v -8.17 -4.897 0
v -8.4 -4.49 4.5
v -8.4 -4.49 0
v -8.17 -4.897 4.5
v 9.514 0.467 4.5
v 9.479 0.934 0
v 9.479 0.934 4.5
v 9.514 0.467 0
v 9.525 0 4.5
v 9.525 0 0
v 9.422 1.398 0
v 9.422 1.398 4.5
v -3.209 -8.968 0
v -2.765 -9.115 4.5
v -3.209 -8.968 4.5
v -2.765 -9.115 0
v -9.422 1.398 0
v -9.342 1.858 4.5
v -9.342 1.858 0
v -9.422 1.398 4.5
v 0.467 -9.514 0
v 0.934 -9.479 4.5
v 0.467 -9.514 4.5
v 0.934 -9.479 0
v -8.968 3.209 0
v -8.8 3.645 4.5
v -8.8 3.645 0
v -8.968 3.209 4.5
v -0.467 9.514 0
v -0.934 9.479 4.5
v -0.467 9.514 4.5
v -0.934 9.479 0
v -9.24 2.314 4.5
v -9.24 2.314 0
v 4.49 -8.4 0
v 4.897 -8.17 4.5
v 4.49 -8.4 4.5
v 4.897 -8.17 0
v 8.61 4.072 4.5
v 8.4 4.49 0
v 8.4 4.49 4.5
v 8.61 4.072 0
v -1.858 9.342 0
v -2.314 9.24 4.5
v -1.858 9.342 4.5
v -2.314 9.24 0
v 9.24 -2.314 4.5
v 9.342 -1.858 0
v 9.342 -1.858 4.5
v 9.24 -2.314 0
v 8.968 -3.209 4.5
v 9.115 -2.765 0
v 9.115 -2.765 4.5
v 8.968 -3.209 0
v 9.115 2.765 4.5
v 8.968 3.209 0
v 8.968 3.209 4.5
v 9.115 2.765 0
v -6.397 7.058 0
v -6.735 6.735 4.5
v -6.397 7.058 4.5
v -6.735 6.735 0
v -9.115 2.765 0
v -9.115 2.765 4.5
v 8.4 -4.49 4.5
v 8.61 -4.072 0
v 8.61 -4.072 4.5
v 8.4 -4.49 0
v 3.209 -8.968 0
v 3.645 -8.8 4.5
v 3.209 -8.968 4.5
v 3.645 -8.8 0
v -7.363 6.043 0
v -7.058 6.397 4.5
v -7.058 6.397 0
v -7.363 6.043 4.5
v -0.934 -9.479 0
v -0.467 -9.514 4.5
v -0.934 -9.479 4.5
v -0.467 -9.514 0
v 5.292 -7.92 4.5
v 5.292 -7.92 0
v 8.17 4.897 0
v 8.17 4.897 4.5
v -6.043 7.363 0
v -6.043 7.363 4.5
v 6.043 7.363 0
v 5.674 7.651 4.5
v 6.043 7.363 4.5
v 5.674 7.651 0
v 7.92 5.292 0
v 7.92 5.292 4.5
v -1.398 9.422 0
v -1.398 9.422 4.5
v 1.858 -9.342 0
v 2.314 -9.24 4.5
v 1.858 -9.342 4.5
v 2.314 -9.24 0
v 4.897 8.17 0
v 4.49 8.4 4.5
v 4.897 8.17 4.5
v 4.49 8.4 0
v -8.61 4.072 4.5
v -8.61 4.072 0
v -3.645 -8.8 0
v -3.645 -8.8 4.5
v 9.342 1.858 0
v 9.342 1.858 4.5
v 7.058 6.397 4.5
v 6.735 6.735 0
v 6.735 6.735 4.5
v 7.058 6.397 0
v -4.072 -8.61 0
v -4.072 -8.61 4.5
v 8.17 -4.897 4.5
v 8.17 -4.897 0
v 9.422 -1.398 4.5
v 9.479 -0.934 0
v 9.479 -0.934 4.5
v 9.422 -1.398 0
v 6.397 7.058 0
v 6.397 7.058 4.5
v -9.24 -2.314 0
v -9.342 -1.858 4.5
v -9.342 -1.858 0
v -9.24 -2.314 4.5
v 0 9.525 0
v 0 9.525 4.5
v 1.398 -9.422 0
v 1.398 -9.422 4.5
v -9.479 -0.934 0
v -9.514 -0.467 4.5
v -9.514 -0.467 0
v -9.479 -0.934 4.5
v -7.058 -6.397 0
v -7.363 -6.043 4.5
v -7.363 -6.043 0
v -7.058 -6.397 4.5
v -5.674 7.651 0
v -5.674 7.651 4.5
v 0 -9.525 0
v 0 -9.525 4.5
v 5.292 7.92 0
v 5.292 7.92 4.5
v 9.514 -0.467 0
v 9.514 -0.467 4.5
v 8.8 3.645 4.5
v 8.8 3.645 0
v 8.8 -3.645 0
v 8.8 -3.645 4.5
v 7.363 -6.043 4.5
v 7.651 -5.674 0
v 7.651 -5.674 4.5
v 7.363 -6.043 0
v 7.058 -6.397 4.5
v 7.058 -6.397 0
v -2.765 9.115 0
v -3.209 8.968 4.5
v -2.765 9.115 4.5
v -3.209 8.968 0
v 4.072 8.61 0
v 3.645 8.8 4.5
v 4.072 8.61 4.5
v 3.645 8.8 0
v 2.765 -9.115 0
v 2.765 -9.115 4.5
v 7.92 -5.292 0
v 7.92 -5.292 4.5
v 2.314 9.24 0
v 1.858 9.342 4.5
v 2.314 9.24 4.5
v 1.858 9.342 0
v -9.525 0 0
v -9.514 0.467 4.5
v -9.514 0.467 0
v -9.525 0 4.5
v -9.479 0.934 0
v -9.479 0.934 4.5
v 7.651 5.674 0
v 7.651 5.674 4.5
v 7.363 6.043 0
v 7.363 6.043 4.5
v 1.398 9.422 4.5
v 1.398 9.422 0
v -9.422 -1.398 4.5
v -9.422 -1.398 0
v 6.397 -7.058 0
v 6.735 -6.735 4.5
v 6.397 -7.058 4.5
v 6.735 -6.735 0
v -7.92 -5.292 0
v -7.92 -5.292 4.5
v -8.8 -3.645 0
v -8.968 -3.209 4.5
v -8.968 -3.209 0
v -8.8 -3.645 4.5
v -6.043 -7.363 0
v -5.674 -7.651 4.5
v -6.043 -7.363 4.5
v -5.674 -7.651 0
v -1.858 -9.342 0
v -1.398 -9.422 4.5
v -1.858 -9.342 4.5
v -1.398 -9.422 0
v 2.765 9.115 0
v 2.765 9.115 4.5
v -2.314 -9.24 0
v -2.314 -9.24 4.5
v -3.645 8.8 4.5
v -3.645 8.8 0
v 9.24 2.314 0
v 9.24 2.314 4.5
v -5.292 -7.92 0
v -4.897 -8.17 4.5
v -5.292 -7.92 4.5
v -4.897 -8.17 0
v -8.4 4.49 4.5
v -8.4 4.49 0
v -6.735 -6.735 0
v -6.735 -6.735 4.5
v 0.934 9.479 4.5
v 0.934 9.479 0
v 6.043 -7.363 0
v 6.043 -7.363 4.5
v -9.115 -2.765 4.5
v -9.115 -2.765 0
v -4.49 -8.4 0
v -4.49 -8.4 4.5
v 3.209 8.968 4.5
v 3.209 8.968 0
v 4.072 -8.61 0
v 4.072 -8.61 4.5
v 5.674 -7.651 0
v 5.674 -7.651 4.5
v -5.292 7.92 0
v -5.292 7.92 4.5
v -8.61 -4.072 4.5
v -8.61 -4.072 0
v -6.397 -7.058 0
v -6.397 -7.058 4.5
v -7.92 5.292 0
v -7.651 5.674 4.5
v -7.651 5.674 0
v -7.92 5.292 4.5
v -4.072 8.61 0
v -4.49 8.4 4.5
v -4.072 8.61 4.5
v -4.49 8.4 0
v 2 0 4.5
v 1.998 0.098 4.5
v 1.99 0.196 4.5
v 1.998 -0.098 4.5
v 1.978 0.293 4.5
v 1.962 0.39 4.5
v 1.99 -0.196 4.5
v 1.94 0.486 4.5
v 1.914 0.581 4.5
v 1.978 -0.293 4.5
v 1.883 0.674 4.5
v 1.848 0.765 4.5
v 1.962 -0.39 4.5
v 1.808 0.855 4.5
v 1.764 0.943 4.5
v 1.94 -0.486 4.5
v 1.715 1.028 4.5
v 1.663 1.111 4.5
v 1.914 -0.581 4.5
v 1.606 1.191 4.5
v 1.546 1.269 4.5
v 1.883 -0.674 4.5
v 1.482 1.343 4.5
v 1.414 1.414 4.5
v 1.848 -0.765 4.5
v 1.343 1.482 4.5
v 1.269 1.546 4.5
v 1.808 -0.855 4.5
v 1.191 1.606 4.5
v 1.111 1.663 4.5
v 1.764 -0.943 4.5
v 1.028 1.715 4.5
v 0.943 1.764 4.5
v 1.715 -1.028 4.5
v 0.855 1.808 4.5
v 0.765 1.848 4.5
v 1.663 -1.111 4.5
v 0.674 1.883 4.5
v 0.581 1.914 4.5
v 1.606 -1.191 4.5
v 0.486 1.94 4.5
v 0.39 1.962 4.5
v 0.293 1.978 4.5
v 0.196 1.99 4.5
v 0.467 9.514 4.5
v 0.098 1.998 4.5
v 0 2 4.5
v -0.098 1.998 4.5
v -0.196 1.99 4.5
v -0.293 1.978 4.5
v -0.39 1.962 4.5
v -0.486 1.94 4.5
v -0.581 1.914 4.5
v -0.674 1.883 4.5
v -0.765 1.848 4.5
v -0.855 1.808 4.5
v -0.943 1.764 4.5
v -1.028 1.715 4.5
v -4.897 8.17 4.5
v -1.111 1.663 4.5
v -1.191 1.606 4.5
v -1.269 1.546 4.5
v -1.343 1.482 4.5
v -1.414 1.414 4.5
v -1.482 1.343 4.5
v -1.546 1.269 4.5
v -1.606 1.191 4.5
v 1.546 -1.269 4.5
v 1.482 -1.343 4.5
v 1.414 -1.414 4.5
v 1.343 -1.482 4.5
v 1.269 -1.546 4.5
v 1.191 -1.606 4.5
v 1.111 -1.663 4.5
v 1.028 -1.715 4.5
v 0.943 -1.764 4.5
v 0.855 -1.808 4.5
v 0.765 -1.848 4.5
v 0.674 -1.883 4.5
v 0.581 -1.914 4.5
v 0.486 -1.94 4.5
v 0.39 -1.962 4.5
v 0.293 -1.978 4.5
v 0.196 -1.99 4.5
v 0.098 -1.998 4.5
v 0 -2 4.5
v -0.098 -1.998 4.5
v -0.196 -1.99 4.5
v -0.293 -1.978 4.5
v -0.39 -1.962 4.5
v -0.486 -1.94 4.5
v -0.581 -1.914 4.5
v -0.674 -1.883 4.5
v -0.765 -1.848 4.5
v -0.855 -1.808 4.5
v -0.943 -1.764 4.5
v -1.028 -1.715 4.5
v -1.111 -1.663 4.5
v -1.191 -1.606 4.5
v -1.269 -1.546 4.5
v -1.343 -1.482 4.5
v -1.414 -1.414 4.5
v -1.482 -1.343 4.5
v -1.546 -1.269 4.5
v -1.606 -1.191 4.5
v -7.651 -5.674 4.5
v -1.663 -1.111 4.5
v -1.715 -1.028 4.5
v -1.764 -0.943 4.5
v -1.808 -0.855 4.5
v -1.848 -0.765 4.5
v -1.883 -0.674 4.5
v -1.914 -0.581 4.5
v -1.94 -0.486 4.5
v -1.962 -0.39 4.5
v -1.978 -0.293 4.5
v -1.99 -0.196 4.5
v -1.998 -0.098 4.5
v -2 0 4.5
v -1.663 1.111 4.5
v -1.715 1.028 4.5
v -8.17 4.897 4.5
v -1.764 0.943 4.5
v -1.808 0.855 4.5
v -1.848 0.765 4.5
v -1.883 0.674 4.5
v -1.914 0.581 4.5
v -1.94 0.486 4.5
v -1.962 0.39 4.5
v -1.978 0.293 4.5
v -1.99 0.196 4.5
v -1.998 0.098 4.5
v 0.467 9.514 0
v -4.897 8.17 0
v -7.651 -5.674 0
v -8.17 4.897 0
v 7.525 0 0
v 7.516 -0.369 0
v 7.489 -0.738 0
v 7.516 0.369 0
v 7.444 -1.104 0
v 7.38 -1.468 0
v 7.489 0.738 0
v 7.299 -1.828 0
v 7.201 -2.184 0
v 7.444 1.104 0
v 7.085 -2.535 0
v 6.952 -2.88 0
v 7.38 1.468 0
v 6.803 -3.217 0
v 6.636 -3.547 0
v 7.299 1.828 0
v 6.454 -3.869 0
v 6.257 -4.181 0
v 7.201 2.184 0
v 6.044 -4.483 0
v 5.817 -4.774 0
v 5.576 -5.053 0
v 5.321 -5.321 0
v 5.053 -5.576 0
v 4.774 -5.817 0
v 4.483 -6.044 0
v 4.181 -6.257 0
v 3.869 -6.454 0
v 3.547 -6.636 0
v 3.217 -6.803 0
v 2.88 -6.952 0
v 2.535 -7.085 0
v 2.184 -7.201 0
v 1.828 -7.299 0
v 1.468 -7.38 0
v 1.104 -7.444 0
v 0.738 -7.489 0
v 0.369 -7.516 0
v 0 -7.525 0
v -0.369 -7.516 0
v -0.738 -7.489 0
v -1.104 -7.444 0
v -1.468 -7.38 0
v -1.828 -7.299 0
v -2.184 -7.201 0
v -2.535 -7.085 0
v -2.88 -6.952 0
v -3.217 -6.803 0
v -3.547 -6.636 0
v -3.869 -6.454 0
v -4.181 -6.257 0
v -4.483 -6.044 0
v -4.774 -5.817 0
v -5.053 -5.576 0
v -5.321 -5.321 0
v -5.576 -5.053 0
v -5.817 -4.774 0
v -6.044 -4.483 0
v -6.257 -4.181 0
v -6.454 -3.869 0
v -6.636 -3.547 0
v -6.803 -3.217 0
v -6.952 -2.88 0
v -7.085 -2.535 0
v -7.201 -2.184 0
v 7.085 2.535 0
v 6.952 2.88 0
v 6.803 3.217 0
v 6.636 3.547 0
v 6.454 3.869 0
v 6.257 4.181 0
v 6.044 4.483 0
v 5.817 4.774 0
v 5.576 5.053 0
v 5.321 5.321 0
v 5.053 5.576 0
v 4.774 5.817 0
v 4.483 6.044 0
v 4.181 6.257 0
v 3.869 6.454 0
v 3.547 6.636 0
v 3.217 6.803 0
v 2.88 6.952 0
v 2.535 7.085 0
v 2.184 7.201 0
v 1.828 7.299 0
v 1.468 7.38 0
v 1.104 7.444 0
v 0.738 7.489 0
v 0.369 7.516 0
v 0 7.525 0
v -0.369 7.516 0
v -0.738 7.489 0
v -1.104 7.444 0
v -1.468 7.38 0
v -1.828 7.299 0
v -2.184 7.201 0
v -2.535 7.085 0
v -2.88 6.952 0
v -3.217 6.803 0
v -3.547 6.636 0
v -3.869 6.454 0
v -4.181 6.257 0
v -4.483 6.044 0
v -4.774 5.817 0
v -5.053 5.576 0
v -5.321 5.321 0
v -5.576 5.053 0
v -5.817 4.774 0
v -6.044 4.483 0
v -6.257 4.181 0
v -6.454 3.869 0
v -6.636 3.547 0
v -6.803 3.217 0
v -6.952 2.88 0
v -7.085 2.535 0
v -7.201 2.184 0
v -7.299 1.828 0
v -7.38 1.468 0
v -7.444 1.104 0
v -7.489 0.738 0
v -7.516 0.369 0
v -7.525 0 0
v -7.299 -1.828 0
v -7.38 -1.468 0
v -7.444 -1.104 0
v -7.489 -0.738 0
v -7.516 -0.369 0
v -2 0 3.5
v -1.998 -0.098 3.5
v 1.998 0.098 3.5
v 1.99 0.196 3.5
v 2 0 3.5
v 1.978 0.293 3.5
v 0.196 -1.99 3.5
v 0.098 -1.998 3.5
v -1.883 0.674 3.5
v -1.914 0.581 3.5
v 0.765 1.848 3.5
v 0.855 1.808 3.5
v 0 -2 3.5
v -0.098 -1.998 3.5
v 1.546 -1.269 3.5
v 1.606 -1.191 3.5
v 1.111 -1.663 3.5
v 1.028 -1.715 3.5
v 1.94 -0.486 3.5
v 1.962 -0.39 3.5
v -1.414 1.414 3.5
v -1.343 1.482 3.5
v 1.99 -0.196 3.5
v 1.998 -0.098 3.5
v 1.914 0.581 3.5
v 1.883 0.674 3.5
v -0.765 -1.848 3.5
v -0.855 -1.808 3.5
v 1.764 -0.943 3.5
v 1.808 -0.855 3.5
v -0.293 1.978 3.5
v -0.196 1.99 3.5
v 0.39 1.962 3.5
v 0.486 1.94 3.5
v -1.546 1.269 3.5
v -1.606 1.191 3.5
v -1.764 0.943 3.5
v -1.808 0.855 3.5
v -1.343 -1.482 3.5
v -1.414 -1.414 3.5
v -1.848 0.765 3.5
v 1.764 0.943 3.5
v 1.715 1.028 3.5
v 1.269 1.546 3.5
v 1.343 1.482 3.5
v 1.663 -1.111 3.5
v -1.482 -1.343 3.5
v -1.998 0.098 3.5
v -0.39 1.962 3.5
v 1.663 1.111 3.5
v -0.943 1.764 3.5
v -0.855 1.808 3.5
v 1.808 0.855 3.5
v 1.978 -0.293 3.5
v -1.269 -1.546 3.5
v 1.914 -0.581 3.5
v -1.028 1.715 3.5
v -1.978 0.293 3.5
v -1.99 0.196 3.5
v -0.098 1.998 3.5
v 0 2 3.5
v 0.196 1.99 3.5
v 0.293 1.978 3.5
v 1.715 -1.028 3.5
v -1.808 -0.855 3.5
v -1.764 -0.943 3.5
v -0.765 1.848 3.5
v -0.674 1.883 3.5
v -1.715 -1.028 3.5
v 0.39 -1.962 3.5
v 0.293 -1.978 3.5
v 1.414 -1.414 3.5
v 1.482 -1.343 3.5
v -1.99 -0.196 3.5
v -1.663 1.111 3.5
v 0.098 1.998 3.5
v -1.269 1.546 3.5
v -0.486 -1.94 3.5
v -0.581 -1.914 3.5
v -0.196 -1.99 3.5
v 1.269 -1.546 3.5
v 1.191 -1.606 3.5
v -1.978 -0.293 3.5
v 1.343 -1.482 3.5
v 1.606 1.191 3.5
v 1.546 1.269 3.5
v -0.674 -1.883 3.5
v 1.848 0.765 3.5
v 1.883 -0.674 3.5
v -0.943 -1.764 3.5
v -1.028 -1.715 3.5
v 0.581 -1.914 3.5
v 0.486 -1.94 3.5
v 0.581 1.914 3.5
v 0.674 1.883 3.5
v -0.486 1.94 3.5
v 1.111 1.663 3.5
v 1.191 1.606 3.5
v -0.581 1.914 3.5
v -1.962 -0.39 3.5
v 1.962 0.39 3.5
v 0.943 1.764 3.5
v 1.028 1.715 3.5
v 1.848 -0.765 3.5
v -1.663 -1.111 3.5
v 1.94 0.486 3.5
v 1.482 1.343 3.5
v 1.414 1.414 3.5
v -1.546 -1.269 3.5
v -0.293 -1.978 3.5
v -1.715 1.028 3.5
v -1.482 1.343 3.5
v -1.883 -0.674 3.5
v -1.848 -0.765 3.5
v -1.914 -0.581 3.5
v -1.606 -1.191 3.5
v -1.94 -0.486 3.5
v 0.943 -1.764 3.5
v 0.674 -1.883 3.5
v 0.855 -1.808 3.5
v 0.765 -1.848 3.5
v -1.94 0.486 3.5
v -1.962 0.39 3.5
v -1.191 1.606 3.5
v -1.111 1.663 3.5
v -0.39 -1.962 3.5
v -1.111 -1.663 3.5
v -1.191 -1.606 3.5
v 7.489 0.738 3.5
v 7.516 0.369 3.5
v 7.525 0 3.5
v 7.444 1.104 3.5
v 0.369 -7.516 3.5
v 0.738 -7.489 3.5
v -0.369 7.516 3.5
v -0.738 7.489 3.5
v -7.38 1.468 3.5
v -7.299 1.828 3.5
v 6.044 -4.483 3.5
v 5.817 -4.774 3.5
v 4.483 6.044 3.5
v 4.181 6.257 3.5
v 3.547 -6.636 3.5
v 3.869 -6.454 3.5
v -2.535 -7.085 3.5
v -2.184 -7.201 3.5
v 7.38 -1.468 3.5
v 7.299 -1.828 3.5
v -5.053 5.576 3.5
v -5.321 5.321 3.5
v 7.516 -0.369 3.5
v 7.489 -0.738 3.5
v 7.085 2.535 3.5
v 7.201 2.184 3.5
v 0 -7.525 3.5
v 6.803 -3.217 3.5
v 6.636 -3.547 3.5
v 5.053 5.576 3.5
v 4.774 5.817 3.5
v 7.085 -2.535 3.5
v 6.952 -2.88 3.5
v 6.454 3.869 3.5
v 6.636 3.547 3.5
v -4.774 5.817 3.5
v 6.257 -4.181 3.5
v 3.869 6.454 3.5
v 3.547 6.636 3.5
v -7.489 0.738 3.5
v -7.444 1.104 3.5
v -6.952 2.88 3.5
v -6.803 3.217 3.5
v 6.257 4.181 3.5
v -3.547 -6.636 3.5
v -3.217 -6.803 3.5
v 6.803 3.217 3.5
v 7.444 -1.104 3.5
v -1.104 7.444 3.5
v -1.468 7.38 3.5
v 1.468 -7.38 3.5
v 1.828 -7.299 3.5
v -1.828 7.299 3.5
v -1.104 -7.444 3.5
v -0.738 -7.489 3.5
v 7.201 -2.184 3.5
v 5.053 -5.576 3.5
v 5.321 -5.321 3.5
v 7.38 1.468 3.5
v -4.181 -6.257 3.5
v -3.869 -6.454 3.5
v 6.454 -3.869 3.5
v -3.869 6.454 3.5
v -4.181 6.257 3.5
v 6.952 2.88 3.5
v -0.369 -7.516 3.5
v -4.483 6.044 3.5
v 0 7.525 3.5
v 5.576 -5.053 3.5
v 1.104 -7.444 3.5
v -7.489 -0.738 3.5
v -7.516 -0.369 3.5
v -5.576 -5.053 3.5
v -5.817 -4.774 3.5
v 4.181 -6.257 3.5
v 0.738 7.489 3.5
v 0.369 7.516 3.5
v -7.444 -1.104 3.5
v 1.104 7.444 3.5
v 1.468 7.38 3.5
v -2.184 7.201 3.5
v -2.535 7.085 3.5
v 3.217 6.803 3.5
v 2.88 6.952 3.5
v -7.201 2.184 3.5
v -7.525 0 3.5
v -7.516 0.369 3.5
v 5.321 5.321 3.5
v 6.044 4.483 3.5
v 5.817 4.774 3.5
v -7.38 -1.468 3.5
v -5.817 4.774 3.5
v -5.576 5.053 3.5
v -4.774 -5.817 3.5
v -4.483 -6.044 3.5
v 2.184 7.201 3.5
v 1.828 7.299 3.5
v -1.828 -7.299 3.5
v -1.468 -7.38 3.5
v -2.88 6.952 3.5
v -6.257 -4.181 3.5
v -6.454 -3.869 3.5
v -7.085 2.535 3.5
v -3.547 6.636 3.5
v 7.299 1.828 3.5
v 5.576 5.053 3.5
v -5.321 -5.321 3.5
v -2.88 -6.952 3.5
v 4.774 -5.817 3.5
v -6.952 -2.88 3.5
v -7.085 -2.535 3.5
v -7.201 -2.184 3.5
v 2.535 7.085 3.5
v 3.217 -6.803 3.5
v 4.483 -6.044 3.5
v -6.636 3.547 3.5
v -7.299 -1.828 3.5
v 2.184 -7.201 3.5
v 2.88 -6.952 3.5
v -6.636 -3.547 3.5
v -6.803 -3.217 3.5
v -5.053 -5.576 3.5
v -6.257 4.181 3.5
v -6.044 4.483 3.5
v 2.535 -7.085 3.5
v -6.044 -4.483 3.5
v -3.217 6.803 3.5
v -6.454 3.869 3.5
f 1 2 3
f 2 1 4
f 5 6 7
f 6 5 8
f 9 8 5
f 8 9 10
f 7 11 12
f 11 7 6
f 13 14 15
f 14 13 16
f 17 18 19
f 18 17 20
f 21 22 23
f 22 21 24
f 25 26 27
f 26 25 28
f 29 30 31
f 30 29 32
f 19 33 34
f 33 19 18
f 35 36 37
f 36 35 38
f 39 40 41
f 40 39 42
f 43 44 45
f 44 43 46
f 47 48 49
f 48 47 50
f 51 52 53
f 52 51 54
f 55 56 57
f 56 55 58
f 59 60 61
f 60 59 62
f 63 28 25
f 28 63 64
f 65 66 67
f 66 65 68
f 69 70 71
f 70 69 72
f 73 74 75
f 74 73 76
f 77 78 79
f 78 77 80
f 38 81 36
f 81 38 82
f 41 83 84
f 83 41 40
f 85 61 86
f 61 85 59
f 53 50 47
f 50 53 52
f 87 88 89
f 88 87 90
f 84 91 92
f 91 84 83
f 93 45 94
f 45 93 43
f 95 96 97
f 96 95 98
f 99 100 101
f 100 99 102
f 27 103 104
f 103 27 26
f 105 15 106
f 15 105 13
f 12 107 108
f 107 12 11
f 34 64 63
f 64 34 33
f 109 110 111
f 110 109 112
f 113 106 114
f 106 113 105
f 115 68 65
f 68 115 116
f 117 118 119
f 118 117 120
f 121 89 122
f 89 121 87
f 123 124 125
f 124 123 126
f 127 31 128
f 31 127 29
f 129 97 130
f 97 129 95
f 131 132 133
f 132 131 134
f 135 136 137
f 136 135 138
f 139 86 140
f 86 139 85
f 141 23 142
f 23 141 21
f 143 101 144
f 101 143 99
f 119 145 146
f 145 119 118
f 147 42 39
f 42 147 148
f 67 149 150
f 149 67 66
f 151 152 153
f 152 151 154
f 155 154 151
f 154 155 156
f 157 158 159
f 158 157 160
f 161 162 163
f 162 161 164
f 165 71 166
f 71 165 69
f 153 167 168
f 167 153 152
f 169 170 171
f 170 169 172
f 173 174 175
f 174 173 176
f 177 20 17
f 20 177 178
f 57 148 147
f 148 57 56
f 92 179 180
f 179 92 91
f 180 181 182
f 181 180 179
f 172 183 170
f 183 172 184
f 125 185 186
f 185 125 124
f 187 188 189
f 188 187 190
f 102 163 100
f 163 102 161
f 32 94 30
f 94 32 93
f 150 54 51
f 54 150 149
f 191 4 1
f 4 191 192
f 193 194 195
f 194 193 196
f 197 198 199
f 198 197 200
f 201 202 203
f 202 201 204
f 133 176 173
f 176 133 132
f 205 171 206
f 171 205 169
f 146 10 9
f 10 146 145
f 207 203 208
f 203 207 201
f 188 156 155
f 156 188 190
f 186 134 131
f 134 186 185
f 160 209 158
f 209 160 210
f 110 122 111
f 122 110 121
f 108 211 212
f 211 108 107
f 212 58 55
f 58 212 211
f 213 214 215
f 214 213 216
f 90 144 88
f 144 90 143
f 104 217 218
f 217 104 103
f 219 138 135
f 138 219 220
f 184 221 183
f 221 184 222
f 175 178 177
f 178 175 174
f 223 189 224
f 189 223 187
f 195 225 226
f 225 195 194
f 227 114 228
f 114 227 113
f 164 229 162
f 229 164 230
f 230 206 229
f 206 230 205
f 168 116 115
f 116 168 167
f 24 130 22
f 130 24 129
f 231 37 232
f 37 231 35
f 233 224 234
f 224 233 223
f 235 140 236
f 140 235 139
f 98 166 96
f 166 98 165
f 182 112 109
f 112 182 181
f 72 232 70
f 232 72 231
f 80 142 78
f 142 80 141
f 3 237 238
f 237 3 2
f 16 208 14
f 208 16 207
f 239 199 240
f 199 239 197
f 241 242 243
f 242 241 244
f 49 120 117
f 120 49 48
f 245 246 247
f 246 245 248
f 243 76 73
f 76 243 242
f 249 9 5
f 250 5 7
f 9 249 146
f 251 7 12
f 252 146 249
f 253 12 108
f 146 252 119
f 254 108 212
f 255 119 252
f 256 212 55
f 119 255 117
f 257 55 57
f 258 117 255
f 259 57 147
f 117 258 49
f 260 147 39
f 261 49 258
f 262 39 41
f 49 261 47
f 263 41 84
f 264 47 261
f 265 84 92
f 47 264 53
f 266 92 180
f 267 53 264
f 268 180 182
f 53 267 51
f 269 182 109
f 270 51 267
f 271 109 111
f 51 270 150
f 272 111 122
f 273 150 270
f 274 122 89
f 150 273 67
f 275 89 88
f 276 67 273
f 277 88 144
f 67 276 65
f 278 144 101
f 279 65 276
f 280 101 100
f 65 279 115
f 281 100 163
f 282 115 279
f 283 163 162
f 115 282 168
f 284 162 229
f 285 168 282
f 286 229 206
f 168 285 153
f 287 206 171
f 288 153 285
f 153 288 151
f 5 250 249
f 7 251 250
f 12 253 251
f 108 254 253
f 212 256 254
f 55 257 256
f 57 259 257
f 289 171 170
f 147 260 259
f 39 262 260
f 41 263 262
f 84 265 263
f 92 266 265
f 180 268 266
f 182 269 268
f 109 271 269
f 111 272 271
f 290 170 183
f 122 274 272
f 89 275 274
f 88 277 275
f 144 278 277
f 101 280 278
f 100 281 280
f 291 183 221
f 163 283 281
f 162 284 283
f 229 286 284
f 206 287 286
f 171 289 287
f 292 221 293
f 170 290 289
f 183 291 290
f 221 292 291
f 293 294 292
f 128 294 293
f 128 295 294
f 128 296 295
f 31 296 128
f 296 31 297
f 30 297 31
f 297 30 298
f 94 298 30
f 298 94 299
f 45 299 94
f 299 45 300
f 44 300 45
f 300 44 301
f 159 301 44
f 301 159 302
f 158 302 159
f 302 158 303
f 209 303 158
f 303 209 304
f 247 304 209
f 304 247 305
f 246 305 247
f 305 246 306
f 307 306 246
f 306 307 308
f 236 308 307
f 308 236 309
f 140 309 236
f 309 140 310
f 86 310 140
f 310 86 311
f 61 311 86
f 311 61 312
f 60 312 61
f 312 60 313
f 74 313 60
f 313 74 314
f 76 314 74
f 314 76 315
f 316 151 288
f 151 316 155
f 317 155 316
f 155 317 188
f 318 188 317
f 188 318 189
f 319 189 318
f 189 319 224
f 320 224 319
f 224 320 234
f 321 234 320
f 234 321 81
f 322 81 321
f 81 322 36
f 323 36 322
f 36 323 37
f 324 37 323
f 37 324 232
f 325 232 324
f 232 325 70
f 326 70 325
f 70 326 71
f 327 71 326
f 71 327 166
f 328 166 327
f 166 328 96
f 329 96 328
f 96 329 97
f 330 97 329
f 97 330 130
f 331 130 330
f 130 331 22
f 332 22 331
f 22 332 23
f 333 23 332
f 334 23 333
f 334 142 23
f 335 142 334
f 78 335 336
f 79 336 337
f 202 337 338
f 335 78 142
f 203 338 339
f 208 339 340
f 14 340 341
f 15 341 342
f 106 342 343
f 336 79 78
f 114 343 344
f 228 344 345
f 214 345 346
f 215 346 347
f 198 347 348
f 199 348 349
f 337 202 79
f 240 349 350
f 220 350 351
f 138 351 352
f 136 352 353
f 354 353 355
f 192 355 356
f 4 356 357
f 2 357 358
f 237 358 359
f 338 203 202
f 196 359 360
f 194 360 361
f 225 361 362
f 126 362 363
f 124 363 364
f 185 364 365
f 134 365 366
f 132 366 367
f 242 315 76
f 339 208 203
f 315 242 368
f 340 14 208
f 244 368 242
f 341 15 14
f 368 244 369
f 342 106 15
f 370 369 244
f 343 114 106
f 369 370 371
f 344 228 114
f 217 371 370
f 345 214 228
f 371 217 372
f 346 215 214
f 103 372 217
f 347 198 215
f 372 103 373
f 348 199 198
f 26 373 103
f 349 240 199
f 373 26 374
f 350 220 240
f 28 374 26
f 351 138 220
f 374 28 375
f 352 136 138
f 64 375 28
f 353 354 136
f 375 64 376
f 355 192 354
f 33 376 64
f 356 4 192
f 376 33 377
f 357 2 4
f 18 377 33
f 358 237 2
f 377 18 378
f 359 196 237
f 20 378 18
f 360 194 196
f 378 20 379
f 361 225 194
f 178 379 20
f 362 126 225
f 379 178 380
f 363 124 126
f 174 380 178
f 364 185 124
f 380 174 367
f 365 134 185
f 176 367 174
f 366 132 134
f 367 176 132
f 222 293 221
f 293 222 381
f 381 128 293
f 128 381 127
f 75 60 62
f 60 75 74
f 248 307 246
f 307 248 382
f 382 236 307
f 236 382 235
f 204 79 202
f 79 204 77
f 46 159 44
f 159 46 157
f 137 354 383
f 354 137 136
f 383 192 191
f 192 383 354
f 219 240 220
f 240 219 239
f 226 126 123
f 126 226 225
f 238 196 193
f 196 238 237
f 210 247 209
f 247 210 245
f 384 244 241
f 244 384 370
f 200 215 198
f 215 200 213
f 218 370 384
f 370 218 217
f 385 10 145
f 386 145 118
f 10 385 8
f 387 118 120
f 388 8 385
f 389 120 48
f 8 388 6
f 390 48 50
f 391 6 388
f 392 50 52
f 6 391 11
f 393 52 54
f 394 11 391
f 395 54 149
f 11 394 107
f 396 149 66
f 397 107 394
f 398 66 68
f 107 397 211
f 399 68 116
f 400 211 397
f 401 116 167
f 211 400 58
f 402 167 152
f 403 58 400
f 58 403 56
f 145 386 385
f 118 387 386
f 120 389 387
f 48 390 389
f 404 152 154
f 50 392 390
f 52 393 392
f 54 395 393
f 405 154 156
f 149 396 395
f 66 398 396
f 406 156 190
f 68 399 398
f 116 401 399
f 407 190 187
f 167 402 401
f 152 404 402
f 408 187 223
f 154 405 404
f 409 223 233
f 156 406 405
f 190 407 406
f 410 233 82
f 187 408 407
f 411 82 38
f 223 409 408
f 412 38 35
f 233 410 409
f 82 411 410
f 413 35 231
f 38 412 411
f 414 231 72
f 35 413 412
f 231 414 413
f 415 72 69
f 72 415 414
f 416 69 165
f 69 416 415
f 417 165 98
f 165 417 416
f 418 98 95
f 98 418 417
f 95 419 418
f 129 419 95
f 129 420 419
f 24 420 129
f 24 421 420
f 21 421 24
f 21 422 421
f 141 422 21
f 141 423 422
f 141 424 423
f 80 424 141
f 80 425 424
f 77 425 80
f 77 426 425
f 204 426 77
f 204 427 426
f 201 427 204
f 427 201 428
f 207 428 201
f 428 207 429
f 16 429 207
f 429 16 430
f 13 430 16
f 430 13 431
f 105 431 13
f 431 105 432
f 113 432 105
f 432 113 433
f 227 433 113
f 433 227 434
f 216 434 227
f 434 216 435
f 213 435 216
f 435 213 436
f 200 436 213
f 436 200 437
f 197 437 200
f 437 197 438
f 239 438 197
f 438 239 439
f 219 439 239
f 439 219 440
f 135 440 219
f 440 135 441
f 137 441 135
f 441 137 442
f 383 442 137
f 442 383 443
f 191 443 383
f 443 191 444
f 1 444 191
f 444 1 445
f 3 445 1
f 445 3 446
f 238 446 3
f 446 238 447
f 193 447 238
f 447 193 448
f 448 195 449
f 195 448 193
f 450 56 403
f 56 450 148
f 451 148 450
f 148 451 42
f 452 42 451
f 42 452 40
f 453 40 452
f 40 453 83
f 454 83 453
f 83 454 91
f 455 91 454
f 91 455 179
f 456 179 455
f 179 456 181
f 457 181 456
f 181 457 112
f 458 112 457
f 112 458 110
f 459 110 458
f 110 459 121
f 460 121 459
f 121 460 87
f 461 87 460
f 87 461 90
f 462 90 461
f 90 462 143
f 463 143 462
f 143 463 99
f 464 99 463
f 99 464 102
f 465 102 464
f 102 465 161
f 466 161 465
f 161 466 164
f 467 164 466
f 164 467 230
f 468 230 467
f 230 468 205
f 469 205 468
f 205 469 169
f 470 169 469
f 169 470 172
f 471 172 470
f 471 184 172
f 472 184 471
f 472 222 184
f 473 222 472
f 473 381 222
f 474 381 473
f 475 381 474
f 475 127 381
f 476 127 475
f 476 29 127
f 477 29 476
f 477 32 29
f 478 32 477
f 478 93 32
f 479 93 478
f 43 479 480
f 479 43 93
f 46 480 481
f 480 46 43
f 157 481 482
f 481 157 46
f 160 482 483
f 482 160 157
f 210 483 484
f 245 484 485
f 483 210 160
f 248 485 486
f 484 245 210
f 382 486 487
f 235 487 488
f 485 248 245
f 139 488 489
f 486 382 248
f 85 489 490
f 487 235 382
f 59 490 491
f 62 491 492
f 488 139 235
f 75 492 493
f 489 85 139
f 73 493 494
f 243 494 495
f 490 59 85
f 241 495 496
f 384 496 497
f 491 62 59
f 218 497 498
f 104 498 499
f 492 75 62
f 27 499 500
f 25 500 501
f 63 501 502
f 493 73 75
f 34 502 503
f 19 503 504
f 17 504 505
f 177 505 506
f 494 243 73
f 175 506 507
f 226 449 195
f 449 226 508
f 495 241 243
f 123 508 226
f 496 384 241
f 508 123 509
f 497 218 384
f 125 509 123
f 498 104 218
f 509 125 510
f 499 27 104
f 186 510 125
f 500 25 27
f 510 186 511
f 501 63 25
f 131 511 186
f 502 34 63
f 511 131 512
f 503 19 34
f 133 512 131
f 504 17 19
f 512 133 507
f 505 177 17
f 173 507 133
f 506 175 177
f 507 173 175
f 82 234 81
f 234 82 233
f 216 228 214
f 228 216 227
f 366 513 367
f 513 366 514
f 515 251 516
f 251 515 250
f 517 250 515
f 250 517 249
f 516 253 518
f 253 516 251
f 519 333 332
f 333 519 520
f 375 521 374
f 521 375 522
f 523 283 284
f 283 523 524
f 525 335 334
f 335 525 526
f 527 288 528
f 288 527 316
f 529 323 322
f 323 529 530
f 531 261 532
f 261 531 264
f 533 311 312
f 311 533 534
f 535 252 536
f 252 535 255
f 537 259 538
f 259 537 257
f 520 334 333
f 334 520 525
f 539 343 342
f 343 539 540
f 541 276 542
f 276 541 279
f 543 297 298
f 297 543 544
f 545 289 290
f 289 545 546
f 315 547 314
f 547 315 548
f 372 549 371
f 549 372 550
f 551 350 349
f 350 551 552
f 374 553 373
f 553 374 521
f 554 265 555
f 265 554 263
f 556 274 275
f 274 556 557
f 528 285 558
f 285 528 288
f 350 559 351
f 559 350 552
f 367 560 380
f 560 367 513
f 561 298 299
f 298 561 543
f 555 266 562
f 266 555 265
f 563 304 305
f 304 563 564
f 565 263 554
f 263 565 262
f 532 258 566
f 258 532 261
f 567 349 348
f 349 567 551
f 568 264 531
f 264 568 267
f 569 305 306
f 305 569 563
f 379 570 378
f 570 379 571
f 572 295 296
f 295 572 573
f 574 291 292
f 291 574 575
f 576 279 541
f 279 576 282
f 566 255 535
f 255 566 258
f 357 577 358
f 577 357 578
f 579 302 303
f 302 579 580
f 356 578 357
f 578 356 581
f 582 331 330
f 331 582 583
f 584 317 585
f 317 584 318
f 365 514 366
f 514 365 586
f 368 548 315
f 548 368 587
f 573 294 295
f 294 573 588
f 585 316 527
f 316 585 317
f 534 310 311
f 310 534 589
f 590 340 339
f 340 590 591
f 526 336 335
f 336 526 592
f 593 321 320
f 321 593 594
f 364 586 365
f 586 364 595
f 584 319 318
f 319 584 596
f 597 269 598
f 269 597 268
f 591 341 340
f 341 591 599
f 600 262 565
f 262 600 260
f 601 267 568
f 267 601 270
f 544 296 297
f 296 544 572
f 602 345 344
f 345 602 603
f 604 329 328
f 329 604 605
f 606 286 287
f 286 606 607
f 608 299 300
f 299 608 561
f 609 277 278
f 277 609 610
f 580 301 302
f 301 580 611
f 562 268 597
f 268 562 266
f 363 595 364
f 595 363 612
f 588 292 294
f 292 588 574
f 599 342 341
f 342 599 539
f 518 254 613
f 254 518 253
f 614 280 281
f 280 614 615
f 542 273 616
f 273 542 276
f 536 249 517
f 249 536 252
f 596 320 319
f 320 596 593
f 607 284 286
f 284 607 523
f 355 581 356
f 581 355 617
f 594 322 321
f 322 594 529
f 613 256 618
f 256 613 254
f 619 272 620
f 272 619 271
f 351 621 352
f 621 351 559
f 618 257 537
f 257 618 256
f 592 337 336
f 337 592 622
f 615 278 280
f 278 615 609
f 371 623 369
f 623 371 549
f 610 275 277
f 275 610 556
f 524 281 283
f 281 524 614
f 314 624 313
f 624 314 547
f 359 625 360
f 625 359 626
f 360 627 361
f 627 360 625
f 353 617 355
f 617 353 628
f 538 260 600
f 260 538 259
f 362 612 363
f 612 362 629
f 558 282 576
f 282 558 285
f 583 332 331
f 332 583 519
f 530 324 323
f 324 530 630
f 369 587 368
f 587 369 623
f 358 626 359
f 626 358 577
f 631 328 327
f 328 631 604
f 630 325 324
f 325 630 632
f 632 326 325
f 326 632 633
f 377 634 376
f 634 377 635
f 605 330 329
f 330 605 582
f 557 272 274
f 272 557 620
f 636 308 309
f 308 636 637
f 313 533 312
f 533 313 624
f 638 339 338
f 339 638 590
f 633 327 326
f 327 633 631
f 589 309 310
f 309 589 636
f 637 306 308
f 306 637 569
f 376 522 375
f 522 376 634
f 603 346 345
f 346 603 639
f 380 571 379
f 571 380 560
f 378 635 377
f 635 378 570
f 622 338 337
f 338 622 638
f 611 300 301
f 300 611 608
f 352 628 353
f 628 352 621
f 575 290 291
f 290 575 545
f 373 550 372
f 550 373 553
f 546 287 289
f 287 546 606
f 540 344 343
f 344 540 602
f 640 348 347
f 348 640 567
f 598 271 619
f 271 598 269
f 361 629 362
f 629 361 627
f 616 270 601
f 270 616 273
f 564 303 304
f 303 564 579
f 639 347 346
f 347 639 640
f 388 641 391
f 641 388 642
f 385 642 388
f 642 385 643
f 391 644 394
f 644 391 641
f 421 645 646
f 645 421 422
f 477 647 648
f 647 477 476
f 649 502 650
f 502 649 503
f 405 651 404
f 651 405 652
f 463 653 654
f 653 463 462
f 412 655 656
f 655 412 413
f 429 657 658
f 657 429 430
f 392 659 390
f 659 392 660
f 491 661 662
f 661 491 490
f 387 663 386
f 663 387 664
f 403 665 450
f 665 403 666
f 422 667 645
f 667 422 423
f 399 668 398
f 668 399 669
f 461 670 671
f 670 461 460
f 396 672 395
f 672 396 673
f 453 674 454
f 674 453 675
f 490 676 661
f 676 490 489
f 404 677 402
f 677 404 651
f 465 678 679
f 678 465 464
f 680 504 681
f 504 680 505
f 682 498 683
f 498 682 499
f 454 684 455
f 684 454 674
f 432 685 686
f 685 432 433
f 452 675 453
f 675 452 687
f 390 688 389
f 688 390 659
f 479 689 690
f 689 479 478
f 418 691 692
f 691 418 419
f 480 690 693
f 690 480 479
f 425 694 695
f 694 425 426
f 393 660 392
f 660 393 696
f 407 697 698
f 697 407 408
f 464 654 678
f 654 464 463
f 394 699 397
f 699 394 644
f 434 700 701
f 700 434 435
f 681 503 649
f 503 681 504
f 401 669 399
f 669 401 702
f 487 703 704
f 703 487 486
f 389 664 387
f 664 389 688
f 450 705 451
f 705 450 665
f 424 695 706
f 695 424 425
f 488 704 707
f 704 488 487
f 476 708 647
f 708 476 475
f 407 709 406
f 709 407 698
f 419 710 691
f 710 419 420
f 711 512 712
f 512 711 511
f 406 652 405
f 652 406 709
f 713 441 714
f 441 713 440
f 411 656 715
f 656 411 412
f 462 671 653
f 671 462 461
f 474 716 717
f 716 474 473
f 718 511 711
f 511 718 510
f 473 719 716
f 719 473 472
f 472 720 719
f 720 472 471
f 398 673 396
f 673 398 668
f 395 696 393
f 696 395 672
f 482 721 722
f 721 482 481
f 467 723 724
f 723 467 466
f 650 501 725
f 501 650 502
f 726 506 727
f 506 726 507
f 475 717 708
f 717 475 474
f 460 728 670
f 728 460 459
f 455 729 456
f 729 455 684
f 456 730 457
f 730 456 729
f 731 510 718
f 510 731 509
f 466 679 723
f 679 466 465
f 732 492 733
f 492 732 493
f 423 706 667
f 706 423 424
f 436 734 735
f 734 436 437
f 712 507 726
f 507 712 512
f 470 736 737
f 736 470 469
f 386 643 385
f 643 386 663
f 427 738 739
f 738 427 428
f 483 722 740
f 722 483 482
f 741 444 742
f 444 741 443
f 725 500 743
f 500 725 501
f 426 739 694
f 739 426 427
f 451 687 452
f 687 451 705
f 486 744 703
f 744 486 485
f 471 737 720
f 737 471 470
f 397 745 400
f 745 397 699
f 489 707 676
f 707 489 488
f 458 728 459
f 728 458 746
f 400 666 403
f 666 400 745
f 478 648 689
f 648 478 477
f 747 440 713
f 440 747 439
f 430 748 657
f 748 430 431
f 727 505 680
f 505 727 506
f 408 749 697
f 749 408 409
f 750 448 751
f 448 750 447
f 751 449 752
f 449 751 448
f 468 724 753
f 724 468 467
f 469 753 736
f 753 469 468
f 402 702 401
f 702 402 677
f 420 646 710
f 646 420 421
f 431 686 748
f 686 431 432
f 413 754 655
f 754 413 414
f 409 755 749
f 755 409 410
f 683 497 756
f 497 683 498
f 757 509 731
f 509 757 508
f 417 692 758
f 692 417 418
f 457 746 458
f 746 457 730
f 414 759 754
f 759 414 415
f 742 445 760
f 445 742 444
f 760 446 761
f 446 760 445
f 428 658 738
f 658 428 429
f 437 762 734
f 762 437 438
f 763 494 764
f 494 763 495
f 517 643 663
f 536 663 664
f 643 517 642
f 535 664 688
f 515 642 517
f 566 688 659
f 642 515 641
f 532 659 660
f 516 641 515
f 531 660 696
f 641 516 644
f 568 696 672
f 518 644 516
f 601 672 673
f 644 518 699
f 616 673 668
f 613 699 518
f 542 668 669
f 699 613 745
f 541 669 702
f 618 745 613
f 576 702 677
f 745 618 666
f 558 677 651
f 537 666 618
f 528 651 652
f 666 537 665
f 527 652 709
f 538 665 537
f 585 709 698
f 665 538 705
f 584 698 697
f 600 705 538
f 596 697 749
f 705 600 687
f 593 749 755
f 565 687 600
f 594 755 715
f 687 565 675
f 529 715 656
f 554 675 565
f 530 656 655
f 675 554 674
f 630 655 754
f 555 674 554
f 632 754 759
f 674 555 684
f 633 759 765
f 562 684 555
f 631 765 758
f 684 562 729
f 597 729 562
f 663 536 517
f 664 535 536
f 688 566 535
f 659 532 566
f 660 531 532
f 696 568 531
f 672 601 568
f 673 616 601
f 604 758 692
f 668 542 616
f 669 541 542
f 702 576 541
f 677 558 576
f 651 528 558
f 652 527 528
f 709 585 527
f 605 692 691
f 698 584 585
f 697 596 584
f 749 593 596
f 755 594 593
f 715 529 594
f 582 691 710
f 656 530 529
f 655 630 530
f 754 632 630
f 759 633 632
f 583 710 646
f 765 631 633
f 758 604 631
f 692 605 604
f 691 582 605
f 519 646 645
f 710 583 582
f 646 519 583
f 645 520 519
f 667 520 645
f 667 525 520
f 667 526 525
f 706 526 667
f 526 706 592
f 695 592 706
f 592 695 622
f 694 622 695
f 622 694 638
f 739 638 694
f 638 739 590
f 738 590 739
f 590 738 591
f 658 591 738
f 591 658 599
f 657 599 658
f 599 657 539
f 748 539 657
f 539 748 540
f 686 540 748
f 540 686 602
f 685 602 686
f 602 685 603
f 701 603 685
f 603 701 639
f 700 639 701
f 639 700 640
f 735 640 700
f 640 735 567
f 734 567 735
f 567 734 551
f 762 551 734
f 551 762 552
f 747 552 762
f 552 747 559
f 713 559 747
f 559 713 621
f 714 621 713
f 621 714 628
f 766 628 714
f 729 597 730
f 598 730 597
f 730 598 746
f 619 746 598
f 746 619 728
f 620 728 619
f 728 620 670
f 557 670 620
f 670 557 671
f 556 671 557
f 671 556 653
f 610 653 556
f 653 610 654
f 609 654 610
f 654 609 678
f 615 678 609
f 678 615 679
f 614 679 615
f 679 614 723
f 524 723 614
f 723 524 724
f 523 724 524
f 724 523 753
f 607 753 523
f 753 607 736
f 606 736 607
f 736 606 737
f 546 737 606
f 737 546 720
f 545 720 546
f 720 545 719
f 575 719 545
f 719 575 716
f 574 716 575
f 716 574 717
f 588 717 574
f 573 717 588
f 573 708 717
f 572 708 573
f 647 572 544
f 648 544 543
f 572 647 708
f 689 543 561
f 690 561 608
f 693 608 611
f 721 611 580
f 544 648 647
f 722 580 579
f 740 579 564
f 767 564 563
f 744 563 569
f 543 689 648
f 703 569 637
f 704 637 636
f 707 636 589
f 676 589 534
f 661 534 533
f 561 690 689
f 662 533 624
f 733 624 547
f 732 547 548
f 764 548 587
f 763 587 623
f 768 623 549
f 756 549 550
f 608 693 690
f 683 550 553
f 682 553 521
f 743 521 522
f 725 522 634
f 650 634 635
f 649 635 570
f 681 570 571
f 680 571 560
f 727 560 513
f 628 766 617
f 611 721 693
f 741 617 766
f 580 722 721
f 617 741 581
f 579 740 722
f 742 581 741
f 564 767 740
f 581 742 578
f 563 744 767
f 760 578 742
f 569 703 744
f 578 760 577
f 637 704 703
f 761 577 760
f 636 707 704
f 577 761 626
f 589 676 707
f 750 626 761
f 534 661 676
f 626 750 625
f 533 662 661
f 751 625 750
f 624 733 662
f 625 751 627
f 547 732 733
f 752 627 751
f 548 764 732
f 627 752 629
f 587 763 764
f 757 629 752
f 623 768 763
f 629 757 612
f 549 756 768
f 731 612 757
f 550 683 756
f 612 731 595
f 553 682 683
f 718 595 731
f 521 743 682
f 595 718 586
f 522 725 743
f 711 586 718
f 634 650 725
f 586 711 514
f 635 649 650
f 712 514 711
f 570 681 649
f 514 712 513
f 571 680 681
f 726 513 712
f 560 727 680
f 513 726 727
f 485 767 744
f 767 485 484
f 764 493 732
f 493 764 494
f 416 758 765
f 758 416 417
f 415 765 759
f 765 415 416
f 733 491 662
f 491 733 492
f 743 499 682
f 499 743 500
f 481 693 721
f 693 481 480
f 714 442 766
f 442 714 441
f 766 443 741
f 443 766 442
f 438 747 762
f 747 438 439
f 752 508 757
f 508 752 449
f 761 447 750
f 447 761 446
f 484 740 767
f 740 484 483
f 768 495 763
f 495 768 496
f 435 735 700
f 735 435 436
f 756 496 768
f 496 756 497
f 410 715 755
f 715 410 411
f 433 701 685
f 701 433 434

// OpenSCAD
magnetHole();

module main() {
  magnetHole();
}

module magnetHole() {
  $fn=128;
  r=7.525;
  d=3.5;
  
  t=d+1;
  difference() {
    cylinder(r=r+2,h=t);
    translate([0,0,-1]) cylinder(r=2,h=t+2);
    translate([0,0,-1]) cylinder(r=r,h=d+1);
  }
}
